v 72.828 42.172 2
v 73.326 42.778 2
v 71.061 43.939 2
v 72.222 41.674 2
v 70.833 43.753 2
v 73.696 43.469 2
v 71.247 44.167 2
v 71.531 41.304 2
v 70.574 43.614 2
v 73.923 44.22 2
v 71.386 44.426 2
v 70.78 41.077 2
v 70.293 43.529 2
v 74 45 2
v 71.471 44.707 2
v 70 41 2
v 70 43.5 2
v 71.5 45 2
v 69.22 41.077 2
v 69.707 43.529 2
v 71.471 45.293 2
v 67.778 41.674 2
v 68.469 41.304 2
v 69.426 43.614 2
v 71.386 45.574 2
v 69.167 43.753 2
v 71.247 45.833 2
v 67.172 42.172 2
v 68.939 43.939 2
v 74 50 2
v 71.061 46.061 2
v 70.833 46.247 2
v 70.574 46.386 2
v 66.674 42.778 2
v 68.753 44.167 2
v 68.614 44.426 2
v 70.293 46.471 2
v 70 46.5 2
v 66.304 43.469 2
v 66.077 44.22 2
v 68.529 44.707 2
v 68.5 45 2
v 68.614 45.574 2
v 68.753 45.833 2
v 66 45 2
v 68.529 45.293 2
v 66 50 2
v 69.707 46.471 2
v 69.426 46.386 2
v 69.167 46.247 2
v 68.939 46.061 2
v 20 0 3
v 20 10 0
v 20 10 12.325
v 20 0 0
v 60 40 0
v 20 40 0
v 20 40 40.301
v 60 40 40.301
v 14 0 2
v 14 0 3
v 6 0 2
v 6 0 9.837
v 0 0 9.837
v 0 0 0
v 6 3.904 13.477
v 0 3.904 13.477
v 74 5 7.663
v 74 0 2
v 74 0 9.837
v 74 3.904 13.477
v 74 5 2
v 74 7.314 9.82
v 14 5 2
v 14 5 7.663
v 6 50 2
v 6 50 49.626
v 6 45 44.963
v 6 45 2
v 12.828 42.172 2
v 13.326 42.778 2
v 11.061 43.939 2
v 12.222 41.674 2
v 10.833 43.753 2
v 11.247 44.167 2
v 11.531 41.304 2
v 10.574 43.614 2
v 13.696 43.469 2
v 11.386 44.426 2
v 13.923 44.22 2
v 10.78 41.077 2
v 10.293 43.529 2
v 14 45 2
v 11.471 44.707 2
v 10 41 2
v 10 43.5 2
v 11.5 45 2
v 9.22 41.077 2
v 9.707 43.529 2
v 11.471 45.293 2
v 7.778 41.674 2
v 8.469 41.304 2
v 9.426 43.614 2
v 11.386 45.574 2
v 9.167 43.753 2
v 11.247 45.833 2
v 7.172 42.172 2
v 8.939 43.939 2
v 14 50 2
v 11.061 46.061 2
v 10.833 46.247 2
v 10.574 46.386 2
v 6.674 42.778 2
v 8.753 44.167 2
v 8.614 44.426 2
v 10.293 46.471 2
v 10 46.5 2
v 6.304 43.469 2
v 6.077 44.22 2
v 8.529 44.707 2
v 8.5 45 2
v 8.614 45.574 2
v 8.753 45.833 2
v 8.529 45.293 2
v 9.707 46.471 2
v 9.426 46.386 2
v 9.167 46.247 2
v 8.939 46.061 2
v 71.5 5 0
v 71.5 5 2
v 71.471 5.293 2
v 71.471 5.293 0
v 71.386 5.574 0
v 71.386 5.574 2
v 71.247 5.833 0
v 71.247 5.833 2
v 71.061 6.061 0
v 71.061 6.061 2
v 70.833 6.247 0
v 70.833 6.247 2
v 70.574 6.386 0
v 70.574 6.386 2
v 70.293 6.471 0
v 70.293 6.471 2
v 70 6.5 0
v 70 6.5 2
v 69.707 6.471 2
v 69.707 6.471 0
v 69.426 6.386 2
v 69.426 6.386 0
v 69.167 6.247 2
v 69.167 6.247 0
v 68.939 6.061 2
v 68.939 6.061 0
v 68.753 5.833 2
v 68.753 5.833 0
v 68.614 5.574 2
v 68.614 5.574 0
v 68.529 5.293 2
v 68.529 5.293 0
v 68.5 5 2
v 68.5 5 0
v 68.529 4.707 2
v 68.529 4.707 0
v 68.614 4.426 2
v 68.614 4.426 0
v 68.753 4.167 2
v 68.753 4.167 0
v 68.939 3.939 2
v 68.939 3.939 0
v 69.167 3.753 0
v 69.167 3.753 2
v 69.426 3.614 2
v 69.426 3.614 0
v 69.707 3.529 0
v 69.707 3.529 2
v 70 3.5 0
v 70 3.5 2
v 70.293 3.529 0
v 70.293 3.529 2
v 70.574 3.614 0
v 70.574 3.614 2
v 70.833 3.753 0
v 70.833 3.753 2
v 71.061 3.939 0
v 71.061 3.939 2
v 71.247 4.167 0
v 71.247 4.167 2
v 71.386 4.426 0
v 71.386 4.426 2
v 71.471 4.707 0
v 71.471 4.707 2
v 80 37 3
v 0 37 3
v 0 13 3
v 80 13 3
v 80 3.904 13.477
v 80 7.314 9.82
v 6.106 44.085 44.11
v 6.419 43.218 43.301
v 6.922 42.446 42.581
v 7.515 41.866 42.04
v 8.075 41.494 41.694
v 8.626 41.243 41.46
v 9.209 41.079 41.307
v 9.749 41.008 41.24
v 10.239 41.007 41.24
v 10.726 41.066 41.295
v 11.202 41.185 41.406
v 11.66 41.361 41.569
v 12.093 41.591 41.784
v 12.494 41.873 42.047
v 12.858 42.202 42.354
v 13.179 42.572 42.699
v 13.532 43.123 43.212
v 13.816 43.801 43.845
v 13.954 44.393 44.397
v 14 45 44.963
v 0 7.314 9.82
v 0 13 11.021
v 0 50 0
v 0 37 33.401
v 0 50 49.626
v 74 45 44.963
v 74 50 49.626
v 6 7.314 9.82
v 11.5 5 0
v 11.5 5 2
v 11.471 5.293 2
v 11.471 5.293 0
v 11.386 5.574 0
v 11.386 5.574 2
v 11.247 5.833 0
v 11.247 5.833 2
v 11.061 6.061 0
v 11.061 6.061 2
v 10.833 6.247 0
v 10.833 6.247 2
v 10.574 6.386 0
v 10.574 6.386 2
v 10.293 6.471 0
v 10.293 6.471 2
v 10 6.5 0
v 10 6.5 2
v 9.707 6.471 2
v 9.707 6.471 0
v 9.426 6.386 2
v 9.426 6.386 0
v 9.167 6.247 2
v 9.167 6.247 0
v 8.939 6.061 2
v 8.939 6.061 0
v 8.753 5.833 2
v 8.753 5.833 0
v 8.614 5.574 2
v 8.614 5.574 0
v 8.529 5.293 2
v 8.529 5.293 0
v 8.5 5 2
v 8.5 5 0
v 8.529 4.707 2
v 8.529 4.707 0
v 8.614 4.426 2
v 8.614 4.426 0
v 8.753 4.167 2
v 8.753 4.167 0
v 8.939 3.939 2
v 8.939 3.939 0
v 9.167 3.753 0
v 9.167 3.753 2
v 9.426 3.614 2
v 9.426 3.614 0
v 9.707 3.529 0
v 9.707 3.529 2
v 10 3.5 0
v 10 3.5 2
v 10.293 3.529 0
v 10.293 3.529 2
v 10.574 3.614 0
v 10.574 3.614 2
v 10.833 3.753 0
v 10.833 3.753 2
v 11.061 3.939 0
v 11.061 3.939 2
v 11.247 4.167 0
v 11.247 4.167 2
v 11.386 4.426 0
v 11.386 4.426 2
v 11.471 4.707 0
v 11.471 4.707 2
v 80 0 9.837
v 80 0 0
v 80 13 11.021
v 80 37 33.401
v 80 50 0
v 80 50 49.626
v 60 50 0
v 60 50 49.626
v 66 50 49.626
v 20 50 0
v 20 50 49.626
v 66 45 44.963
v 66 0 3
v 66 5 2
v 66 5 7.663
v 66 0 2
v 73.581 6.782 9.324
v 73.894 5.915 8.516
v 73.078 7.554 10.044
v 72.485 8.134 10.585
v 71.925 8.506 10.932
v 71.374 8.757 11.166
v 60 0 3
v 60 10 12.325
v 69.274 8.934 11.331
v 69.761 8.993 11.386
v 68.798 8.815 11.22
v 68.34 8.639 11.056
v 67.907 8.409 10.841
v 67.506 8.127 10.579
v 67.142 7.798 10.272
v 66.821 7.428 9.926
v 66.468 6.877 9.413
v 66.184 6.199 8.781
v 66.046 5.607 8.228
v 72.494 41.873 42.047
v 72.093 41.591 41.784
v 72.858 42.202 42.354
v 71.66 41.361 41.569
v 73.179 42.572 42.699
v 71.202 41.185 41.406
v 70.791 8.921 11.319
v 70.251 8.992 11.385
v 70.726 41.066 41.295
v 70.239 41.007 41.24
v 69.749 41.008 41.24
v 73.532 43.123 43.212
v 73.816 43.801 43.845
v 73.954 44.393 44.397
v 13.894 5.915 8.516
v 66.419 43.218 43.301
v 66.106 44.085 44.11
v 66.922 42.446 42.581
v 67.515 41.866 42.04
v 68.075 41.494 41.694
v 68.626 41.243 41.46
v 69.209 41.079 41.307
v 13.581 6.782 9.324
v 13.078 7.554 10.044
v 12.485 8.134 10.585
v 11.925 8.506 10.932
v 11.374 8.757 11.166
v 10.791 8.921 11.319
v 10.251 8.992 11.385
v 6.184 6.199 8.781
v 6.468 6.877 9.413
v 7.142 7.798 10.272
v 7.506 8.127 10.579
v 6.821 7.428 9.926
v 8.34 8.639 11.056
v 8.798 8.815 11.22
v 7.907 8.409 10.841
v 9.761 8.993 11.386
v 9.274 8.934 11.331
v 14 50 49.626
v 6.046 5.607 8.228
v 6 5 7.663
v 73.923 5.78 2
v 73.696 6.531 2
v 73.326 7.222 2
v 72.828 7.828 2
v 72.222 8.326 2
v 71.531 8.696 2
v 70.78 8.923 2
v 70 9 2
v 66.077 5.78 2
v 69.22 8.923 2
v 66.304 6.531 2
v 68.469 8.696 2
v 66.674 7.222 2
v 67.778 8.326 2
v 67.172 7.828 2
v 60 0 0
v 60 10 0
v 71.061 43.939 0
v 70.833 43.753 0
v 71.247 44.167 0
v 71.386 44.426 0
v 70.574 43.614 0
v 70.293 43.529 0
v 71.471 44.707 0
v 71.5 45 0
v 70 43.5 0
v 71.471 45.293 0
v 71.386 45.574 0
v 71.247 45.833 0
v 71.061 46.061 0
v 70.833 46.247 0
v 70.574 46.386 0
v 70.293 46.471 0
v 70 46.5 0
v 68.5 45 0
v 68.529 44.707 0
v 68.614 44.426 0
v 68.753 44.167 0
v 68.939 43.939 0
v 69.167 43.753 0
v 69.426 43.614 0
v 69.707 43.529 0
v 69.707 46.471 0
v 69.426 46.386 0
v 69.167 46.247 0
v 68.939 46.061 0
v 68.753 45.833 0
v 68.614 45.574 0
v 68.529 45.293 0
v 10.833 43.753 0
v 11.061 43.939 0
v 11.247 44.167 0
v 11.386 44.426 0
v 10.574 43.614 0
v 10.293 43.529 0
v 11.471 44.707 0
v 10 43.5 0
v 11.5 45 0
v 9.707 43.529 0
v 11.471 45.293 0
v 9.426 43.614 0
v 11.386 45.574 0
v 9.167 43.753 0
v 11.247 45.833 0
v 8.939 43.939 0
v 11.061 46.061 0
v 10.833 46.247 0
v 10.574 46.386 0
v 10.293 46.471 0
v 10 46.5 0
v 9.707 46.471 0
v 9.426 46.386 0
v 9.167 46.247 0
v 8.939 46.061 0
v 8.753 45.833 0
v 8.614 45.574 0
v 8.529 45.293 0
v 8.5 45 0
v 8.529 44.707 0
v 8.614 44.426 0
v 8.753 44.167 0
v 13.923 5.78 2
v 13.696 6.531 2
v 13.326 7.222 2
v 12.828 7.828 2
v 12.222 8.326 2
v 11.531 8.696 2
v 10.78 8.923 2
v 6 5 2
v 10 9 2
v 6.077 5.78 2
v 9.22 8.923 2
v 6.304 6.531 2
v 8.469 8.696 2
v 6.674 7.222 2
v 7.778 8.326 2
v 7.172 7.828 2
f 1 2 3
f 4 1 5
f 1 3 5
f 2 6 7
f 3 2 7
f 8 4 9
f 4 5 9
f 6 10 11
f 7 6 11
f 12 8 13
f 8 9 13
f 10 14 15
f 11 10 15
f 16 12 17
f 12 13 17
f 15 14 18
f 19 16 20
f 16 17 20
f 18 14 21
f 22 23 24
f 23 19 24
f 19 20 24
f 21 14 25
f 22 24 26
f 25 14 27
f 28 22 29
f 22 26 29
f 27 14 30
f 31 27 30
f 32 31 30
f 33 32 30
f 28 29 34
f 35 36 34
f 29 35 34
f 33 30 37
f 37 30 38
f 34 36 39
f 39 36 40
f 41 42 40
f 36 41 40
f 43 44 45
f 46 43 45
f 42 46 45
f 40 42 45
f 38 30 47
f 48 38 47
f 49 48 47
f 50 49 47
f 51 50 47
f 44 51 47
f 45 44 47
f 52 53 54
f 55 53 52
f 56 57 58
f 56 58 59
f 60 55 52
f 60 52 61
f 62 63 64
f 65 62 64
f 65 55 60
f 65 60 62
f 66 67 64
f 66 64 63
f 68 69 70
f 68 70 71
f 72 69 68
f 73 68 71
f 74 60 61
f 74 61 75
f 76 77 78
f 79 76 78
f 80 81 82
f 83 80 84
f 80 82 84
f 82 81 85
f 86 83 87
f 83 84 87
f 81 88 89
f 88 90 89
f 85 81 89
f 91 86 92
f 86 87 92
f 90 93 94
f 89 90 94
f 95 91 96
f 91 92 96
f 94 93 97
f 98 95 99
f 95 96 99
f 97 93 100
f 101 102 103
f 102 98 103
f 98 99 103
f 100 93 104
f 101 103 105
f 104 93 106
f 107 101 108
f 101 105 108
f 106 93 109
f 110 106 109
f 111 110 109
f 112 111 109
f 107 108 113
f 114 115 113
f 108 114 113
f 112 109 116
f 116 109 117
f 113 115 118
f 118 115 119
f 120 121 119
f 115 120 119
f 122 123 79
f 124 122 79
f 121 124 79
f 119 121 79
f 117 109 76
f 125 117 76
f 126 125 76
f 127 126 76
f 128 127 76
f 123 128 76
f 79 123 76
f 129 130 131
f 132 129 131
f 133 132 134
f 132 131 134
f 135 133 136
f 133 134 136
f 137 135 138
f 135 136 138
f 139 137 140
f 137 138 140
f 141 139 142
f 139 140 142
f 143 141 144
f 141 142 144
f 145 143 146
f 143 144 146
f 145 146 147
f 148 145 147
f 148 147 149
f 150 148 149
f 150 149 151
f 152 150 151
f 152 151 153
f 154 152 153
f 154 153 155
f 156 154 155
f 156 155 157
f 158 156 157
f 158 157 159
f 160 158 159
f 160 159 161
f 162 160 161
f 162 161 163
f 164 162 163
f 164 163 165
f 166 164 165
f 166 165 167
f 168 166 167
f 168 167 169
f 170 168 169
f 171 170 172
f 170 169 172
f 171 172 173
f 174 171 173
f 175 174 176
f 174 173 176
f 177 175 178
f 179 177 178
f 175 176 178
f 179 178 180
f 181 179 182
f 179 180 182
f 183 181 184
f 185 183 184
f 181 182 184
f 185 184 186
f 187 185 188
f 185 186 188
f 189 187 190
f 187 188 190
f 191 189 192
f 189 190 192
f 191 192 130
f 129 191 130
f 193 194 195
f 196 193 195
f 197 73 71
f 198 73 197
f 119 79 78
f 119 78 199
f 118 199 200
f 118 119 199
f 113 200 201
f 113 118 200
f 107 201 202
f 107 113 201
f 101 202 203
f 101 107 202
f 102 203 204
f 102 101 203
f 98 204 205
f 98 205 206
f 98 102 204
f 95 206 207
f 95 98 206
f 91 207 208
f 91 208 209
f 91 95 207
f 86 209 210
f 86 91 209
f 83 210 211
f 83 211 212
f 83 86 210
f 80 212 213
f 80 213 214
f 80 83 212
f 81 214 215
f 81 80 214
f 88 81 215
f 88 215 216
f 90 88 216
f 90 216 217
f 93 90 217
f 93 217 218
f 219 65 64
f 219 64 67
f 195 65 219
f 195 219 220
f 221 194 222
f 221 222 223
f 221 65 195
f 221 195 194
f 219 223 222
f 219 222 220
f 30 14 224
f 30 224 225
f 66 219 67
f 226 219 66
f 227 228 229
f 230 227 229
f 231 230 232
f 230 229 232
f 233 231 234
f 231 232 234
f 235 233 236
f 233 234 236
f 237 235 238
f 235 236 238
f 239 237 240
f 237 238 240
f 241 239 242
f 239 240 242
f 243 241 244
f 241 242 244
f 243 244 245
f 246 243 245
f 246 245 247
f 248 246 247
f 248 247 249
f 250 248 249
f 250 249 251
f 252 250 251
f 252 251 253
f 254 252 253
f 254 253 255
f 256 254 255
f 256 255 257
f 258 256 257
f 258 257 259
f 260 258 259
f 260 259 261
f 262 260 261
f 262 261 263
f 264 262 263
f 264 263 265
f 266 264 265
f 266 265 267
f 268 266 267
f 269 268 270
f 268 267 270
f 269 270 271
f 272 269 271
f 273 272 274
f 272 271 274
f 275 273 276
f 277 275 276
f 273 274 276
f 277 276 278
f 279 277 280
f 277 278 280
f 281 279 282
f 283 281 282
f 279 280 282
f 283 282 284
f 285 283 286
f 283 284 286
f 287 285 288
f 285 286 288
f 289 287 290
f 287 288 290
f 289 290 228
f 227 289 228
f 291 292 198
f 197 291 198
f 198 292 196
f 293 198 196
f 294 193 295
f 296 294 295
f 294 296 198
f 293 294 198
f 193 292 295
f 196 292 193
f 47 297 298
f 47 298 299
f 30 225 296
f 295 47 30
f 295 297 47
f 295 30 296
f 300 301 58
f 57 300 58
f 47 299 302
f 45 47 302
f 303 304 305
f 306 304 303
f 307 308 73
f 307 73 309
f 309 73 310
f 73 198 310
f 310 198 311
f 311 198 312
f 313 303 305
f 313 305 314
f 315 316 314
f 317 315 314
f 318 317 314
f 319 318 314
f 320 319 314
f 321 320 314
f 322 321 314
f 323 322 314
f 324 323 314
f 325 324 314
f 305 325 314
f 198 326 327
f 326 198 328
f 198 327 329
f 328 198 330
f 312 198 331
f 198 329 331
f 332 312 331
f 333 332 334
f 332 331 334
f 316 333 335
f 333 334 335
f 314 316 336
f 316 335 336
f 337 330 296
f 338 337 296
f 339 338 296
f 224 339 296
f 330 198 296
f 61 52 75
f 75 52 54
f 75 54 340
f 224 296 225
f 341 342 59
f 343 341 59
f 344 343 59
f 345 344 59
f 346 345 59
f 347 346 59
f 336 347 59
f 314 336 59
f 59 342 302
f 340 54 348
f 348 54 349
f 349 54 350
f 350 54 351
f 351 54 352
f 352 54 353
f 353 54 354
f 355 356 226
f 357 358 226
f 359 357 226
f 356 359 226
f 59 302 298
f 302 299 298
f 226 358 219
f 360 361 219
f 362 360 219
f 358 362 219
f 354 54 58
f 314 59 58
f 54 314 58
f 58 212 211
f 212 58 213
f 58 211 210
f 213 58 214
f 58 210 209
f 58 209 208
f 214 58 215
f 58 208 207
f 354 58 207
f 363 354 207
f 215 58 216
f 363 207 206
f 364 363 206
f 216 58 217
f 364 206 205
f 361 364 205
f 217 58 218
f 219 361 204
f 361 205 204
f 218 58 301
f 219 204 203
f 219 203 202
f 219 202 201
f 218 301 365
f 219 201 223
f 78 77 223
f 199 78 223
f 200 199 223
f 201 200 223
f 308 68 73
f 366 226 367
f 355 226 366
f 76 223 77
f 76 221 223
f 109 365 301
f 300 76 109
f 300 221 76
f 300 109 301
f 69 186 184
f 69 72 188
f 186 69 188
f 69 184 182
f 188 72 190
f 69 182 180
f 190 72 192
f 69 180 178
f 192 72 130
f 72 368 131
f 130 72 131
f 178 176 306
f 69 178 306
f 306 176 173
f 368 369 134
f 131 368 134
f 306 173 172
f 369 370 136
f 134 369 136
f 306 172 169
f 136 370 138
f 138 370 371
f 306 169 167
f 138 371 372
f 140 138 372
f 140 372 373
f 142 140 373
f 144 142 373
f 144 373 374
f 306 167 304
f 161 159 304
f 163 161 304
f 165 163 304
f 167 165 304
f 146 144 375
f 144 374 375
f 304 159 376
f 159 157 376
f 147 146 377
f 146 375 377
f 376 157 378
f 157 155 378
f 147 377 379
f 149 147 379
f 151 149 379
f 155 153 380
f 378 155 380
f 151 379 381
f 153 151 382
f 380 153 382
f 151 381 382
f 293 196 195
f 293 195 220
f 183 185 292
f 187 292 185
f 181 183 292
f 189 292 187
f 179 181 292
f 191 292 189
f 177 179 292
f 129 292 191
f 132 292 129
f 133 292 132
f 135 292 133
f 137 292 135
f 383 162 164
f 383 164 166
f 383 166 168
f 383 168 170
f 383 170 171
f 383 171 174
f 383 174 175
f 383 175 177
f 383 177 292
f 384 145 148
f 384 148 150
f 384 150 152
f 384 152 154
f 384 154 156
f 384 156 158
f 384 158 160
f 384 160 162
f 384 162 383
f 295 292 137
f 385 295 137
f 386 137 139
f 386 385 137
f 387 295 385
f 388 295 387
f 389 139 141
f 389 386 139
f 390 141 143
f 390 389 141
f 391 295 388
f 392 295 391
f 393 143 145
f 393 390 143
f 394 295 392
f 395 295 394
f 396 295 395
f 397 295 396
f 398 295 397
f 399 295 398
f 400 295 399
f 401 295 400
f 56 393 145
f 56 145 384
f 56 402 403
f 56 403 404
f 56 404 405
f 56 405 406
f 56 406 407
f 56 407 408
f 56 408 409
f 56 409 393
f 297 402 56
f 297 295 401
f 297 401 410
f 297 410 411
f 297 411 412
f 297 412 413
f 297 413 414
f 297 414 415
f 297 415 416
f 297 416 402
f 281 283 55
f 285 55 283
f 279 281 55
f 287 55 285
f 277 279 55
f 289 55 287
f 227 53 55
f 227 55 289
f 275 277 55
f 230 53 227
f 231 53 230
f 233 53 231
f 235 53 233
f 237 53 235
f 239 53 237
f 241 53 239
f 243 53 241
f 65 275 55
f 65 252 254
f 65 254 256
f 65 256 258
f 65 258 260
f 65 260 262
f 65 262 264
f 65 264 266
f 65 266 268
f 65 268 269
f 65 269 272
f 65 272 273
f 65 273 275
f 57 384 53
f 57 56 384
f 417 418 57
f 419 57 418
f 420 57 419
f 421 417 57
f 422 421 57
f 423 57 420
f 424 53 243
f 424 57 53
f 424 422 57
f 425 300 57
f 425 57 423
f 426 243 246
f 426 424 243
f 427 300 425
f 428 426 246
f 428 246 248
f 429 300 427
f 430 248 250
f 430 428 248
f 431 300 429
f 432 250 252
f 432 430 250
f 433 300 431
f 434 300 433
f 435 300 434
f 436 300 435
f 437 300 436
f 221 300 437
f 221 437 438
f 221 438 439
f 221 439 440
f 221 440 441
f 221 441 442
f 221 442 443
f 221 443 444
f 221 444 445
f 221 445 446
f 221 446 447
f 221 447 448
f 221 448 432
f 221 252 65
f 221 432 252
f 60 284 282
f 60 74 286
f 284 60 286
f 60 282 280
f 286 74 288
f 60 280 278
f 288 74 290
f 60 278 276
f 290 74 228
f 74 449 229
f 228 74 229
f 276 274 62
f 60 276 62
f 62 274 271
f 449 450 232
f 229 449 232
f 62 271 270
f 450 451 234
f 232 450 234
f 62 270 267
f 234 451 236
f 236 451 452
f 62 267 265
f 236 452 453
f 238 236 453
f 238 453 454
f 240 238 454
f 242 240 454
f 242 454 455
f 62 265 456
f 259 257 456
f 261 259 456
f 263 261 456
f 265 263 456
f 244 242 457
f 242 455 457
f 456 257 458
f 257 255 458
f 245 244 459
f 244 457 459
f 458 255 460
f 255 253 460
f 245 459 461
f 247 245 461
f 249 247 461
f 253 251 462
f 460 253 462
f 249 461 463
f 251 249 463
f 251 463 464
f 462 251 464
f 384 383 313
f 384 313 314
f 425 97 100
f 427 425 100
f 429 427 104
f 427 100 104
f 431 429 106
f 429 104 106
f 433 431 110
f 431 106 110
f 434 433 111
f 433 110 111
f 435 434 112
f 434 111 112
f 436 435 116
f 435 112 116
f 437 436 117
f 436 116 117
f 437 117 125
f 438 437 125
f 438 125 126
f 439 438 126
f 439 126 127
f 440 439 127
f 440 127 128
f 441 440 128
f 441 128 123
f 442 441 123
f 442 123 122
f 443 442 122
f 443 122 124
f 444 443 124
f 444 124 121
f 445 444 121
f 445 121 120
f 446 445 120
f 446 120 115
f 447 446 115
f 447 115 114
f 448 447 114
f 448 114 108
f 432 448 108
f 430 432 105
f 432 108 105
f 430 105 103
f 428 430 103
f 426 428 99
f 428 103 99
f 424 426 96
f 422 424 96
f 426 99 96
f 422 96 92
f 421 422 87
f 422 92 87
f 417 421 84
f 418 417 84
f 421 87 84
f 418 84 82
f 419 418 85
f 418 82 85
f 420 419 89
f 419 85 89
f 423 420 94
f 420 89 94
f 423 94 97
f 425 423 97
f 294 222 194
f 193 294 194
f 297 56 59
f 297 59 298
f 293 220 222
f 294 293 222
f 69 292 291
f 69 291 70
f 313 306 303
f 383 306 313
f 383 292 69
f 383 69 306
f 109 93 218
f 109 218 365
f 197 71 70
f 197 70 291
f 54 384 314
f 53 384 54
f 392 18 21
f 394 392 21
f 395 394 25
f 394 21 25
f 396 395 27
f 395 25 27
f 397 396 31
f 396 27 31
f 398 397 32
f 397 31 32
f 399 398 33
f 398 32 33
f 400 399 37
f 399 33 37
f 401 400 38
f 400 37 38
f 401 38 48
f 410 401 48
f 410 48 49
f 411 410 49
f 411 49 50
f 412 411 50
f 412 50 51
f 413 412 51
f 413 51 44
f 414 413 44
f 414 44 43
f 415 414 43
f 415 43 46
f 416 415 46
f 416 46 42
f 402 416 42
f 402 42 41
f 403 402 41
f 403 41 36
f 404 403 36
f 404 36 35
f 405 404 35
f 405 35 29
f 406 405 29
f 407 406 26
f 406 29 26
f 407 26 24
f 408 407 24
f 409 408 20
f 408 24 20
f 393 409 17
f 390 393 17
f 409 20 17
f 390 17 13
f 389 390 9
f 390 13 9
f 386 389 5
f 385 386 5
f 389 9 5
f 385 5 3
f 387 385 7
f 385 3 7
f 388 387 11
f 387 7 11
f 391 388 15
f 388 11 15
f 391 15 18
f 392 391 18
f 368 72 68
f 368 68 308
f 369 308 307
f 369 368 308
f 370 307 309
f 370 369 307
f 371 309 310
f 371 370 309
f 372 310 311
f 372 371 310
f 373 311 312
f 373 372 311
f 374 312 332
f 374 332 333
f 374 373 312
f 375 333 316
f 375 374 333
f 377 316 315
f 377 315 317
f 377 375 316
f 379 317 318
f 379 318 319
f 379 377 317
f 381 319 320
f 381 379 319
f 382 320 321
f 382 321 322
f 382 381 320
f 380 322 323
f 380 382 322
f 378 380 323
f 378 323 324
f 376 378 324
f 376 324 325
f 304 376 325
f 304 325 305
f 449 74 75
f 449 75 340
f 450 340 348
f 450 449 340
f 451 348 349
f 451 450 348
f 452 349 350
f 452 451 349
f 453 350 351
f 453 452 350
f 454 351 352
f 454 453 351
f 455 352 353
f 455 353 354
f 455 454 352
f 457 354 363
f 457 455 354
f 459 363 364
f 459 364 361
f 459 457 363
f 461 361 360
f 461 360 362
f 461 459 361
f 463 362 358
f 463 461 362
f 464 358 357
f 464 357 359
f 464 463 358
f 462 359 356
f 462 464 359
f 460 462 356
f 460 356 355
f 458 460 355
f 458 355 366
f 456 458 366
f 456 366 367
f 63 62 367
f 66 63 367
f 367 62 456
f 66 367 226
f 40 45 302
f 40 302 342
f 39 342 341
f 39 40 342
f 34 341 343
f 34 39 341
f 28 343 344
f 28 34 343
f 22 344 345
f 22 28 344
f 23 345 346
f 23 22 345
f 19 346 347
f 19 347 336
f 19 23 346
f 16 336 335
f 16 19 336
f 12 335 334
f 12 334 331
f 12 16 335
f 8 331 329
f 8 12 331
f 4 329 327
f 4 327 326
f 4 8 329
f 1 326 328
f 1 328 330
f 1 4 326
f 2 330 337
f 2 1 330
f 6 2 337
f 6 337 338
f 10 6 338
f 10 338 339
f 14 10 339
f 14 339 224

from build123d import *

# Parameters (mm, degrees)
EXTRUDE_2_DEPTH     = 2
SKETCH_3_R          = 1.5
CUT_EXTRUDE_1_DEPTH = 95.361008897
EXTRUDE_3_DEPTH     = 1
DRAFT_4_ANGLE       = 43
SKETCH_6_W          = 6
SKETCH_6_H          = 10
EXTRUDE_4_DEPTH     = 5
SKETCH_7_W          = 6
SKETCH_7_H          = 10
EXTRUDE_5_DEPTH     = 5
CUT_EXTRUDE_2_DEPTH = 107.596038813
CUT_EXTRUDE_4_DEPTH = 107.596038813


with BuildPart() as part:
    # 草图1 → 凸台-拉伸2 (new body)
    with BuildSketch(Plane.XY):
        Polygon((0, 0), (0, 50), (20, 50), (20, 40), (60, 40), (60, 50), (80, 50), (80, 0), (60, 0), (60, 10), (20, 10), (20, 0), align=None)
    extrude(amount=EXTRUDE_2_DEPTH)

    # 草图3 → 切除-拉伸1 (cut, through all)
    with BuildSketch(Plane.XY.offset(2)):
        with Locations((10, 45)):
            Circle(SKETCH_3_R)
        with Locations((10, 5)):
            Circle(SKETCH_3_R)
        with Locations((70, 45)):
            Circle(SKETCH_3_R)
        with Locations((70, 5)):
            Circle(SKETCH_3_R)
    extrude(amount=-CUT_EXTRUDE_1_DEPTH, mode=Mode.SUBTRACT)

    # 草图5 → 凸台-拉伸3 (add)
    with BuildSketch(Plane.XY.offset(2)):
        with BuildLine():
            Line((0, 50), (6, 50))
            Line((6, 50), (6, 45))
            ThreePointArc((6, 45), (10, 41), (14, 45))
            Line((14, 45), (14, 50))
            Line((14, 50), (20, 50))
            Line((20, 50), (20, 40))
            Line((20, 40), (60, 40))
            Line((60, 40), (60, 50))
            Line((60, 50), (66, 50))
            Line((66, 50), (66, 45))
            ThreePointArc((66, 45), (70, 41), (74, 45))
            Line((74, 45), (74, 50))
            Line((74, 50), (80, 50))
            Line((80, 50), (80, 0))
            Line((80, 0), (74, 0))
            Line((74, 0), (74, 5))
            ThreePointArc((74, 5), (70, 9), (66, 5))
            Line((66, 5), (66, 0))
            Line((66, 0), (60, 0))
            Line((60, 0), (60, 10))
            Line((60, 10), (20, 10))
            Line((20, 10), (20, 0))
            Line((20, 0), (14, 0))
            Line((14, 0), (14, 5))
            ThreePointArc((14, 5), (10, 9), (6, 5))
            Line((6, 5), (6, 0))
            Line((6, 0), (0, 0))
            Line((0, 0), (0, 50))
        make_face()
    extrude(amount=EXTRUDE_3_DEPTH)

    # 拔模4
    draft_4_faces = [part.faces().sort_by_distance(p)[0] for p in [
        (40, 25, 3),
    ]]
    draft(draft_4_faces, Plane(origin=(20, 0, 2), x_dir=(-1, 0, 0), z_dir=(0, -1, 0)), DRAFT_4_ANGLE)

    # 草图6 → 凸台-拉伸4 (add)
    with BuildSketch(Plane(origin=(0, -1.496346075, 1.604634711), x_dir=(1, 0, 0), z_dir=(0, -0.6819983600624997, 0.7313537016191695))):
        with Locations((3, 7.04599508)):
            Rectangle(SKETCH_6_W, SKETCH_6_H)
    extrude(amount=EXTRUDE_4_DEPTH)

    # 草图7 → 凸台-拉伸5 (add)
    with BuildSketch(Plane(origin=(0, -1.496346075, 1.604634711), x_dir=(1, 0, 0), z_dir=(0, -0.6819983600624997, 0.7313537016191695))):
        with Locations((77, 7.04599508)):
            Rectangle(SKETCH_7_W, SKETCH_7_H)
    extrude(amount=EXTRUDE_5_DEPTH)

    # 草图8 → 切除-拉伸2 (cut, through all)
    with BuildSketch(Plane(origin=(80, 0, 0), x_dir=(0, 0, -1), z_dir=(1, 0, 0))):
        Polygon((-3, 0), (-9.836637305, 0), (-6.656768508, -3.4099918), align=None)
    extrude(amount=-CUT_EXTRUDE_2_DEPTH, mode=Mode.SUBTRACT)

    # 草图11 → 切除-拉伸4 (cut, through all)
    with BuildSketch(Plane(origin=(80, 0, 0), x_dir=(0, 0, -1), z_dir=(1, 0, 0))):
        Polygon((-3, 37), (-3, 13), (-11.020713736, 13), (-33.401075804, 37), align=None)
    extrude(amount=-CUT_EXTRUDE_4_DEPTH, mode=Mode.SUBTRACT)


solid = part.part
